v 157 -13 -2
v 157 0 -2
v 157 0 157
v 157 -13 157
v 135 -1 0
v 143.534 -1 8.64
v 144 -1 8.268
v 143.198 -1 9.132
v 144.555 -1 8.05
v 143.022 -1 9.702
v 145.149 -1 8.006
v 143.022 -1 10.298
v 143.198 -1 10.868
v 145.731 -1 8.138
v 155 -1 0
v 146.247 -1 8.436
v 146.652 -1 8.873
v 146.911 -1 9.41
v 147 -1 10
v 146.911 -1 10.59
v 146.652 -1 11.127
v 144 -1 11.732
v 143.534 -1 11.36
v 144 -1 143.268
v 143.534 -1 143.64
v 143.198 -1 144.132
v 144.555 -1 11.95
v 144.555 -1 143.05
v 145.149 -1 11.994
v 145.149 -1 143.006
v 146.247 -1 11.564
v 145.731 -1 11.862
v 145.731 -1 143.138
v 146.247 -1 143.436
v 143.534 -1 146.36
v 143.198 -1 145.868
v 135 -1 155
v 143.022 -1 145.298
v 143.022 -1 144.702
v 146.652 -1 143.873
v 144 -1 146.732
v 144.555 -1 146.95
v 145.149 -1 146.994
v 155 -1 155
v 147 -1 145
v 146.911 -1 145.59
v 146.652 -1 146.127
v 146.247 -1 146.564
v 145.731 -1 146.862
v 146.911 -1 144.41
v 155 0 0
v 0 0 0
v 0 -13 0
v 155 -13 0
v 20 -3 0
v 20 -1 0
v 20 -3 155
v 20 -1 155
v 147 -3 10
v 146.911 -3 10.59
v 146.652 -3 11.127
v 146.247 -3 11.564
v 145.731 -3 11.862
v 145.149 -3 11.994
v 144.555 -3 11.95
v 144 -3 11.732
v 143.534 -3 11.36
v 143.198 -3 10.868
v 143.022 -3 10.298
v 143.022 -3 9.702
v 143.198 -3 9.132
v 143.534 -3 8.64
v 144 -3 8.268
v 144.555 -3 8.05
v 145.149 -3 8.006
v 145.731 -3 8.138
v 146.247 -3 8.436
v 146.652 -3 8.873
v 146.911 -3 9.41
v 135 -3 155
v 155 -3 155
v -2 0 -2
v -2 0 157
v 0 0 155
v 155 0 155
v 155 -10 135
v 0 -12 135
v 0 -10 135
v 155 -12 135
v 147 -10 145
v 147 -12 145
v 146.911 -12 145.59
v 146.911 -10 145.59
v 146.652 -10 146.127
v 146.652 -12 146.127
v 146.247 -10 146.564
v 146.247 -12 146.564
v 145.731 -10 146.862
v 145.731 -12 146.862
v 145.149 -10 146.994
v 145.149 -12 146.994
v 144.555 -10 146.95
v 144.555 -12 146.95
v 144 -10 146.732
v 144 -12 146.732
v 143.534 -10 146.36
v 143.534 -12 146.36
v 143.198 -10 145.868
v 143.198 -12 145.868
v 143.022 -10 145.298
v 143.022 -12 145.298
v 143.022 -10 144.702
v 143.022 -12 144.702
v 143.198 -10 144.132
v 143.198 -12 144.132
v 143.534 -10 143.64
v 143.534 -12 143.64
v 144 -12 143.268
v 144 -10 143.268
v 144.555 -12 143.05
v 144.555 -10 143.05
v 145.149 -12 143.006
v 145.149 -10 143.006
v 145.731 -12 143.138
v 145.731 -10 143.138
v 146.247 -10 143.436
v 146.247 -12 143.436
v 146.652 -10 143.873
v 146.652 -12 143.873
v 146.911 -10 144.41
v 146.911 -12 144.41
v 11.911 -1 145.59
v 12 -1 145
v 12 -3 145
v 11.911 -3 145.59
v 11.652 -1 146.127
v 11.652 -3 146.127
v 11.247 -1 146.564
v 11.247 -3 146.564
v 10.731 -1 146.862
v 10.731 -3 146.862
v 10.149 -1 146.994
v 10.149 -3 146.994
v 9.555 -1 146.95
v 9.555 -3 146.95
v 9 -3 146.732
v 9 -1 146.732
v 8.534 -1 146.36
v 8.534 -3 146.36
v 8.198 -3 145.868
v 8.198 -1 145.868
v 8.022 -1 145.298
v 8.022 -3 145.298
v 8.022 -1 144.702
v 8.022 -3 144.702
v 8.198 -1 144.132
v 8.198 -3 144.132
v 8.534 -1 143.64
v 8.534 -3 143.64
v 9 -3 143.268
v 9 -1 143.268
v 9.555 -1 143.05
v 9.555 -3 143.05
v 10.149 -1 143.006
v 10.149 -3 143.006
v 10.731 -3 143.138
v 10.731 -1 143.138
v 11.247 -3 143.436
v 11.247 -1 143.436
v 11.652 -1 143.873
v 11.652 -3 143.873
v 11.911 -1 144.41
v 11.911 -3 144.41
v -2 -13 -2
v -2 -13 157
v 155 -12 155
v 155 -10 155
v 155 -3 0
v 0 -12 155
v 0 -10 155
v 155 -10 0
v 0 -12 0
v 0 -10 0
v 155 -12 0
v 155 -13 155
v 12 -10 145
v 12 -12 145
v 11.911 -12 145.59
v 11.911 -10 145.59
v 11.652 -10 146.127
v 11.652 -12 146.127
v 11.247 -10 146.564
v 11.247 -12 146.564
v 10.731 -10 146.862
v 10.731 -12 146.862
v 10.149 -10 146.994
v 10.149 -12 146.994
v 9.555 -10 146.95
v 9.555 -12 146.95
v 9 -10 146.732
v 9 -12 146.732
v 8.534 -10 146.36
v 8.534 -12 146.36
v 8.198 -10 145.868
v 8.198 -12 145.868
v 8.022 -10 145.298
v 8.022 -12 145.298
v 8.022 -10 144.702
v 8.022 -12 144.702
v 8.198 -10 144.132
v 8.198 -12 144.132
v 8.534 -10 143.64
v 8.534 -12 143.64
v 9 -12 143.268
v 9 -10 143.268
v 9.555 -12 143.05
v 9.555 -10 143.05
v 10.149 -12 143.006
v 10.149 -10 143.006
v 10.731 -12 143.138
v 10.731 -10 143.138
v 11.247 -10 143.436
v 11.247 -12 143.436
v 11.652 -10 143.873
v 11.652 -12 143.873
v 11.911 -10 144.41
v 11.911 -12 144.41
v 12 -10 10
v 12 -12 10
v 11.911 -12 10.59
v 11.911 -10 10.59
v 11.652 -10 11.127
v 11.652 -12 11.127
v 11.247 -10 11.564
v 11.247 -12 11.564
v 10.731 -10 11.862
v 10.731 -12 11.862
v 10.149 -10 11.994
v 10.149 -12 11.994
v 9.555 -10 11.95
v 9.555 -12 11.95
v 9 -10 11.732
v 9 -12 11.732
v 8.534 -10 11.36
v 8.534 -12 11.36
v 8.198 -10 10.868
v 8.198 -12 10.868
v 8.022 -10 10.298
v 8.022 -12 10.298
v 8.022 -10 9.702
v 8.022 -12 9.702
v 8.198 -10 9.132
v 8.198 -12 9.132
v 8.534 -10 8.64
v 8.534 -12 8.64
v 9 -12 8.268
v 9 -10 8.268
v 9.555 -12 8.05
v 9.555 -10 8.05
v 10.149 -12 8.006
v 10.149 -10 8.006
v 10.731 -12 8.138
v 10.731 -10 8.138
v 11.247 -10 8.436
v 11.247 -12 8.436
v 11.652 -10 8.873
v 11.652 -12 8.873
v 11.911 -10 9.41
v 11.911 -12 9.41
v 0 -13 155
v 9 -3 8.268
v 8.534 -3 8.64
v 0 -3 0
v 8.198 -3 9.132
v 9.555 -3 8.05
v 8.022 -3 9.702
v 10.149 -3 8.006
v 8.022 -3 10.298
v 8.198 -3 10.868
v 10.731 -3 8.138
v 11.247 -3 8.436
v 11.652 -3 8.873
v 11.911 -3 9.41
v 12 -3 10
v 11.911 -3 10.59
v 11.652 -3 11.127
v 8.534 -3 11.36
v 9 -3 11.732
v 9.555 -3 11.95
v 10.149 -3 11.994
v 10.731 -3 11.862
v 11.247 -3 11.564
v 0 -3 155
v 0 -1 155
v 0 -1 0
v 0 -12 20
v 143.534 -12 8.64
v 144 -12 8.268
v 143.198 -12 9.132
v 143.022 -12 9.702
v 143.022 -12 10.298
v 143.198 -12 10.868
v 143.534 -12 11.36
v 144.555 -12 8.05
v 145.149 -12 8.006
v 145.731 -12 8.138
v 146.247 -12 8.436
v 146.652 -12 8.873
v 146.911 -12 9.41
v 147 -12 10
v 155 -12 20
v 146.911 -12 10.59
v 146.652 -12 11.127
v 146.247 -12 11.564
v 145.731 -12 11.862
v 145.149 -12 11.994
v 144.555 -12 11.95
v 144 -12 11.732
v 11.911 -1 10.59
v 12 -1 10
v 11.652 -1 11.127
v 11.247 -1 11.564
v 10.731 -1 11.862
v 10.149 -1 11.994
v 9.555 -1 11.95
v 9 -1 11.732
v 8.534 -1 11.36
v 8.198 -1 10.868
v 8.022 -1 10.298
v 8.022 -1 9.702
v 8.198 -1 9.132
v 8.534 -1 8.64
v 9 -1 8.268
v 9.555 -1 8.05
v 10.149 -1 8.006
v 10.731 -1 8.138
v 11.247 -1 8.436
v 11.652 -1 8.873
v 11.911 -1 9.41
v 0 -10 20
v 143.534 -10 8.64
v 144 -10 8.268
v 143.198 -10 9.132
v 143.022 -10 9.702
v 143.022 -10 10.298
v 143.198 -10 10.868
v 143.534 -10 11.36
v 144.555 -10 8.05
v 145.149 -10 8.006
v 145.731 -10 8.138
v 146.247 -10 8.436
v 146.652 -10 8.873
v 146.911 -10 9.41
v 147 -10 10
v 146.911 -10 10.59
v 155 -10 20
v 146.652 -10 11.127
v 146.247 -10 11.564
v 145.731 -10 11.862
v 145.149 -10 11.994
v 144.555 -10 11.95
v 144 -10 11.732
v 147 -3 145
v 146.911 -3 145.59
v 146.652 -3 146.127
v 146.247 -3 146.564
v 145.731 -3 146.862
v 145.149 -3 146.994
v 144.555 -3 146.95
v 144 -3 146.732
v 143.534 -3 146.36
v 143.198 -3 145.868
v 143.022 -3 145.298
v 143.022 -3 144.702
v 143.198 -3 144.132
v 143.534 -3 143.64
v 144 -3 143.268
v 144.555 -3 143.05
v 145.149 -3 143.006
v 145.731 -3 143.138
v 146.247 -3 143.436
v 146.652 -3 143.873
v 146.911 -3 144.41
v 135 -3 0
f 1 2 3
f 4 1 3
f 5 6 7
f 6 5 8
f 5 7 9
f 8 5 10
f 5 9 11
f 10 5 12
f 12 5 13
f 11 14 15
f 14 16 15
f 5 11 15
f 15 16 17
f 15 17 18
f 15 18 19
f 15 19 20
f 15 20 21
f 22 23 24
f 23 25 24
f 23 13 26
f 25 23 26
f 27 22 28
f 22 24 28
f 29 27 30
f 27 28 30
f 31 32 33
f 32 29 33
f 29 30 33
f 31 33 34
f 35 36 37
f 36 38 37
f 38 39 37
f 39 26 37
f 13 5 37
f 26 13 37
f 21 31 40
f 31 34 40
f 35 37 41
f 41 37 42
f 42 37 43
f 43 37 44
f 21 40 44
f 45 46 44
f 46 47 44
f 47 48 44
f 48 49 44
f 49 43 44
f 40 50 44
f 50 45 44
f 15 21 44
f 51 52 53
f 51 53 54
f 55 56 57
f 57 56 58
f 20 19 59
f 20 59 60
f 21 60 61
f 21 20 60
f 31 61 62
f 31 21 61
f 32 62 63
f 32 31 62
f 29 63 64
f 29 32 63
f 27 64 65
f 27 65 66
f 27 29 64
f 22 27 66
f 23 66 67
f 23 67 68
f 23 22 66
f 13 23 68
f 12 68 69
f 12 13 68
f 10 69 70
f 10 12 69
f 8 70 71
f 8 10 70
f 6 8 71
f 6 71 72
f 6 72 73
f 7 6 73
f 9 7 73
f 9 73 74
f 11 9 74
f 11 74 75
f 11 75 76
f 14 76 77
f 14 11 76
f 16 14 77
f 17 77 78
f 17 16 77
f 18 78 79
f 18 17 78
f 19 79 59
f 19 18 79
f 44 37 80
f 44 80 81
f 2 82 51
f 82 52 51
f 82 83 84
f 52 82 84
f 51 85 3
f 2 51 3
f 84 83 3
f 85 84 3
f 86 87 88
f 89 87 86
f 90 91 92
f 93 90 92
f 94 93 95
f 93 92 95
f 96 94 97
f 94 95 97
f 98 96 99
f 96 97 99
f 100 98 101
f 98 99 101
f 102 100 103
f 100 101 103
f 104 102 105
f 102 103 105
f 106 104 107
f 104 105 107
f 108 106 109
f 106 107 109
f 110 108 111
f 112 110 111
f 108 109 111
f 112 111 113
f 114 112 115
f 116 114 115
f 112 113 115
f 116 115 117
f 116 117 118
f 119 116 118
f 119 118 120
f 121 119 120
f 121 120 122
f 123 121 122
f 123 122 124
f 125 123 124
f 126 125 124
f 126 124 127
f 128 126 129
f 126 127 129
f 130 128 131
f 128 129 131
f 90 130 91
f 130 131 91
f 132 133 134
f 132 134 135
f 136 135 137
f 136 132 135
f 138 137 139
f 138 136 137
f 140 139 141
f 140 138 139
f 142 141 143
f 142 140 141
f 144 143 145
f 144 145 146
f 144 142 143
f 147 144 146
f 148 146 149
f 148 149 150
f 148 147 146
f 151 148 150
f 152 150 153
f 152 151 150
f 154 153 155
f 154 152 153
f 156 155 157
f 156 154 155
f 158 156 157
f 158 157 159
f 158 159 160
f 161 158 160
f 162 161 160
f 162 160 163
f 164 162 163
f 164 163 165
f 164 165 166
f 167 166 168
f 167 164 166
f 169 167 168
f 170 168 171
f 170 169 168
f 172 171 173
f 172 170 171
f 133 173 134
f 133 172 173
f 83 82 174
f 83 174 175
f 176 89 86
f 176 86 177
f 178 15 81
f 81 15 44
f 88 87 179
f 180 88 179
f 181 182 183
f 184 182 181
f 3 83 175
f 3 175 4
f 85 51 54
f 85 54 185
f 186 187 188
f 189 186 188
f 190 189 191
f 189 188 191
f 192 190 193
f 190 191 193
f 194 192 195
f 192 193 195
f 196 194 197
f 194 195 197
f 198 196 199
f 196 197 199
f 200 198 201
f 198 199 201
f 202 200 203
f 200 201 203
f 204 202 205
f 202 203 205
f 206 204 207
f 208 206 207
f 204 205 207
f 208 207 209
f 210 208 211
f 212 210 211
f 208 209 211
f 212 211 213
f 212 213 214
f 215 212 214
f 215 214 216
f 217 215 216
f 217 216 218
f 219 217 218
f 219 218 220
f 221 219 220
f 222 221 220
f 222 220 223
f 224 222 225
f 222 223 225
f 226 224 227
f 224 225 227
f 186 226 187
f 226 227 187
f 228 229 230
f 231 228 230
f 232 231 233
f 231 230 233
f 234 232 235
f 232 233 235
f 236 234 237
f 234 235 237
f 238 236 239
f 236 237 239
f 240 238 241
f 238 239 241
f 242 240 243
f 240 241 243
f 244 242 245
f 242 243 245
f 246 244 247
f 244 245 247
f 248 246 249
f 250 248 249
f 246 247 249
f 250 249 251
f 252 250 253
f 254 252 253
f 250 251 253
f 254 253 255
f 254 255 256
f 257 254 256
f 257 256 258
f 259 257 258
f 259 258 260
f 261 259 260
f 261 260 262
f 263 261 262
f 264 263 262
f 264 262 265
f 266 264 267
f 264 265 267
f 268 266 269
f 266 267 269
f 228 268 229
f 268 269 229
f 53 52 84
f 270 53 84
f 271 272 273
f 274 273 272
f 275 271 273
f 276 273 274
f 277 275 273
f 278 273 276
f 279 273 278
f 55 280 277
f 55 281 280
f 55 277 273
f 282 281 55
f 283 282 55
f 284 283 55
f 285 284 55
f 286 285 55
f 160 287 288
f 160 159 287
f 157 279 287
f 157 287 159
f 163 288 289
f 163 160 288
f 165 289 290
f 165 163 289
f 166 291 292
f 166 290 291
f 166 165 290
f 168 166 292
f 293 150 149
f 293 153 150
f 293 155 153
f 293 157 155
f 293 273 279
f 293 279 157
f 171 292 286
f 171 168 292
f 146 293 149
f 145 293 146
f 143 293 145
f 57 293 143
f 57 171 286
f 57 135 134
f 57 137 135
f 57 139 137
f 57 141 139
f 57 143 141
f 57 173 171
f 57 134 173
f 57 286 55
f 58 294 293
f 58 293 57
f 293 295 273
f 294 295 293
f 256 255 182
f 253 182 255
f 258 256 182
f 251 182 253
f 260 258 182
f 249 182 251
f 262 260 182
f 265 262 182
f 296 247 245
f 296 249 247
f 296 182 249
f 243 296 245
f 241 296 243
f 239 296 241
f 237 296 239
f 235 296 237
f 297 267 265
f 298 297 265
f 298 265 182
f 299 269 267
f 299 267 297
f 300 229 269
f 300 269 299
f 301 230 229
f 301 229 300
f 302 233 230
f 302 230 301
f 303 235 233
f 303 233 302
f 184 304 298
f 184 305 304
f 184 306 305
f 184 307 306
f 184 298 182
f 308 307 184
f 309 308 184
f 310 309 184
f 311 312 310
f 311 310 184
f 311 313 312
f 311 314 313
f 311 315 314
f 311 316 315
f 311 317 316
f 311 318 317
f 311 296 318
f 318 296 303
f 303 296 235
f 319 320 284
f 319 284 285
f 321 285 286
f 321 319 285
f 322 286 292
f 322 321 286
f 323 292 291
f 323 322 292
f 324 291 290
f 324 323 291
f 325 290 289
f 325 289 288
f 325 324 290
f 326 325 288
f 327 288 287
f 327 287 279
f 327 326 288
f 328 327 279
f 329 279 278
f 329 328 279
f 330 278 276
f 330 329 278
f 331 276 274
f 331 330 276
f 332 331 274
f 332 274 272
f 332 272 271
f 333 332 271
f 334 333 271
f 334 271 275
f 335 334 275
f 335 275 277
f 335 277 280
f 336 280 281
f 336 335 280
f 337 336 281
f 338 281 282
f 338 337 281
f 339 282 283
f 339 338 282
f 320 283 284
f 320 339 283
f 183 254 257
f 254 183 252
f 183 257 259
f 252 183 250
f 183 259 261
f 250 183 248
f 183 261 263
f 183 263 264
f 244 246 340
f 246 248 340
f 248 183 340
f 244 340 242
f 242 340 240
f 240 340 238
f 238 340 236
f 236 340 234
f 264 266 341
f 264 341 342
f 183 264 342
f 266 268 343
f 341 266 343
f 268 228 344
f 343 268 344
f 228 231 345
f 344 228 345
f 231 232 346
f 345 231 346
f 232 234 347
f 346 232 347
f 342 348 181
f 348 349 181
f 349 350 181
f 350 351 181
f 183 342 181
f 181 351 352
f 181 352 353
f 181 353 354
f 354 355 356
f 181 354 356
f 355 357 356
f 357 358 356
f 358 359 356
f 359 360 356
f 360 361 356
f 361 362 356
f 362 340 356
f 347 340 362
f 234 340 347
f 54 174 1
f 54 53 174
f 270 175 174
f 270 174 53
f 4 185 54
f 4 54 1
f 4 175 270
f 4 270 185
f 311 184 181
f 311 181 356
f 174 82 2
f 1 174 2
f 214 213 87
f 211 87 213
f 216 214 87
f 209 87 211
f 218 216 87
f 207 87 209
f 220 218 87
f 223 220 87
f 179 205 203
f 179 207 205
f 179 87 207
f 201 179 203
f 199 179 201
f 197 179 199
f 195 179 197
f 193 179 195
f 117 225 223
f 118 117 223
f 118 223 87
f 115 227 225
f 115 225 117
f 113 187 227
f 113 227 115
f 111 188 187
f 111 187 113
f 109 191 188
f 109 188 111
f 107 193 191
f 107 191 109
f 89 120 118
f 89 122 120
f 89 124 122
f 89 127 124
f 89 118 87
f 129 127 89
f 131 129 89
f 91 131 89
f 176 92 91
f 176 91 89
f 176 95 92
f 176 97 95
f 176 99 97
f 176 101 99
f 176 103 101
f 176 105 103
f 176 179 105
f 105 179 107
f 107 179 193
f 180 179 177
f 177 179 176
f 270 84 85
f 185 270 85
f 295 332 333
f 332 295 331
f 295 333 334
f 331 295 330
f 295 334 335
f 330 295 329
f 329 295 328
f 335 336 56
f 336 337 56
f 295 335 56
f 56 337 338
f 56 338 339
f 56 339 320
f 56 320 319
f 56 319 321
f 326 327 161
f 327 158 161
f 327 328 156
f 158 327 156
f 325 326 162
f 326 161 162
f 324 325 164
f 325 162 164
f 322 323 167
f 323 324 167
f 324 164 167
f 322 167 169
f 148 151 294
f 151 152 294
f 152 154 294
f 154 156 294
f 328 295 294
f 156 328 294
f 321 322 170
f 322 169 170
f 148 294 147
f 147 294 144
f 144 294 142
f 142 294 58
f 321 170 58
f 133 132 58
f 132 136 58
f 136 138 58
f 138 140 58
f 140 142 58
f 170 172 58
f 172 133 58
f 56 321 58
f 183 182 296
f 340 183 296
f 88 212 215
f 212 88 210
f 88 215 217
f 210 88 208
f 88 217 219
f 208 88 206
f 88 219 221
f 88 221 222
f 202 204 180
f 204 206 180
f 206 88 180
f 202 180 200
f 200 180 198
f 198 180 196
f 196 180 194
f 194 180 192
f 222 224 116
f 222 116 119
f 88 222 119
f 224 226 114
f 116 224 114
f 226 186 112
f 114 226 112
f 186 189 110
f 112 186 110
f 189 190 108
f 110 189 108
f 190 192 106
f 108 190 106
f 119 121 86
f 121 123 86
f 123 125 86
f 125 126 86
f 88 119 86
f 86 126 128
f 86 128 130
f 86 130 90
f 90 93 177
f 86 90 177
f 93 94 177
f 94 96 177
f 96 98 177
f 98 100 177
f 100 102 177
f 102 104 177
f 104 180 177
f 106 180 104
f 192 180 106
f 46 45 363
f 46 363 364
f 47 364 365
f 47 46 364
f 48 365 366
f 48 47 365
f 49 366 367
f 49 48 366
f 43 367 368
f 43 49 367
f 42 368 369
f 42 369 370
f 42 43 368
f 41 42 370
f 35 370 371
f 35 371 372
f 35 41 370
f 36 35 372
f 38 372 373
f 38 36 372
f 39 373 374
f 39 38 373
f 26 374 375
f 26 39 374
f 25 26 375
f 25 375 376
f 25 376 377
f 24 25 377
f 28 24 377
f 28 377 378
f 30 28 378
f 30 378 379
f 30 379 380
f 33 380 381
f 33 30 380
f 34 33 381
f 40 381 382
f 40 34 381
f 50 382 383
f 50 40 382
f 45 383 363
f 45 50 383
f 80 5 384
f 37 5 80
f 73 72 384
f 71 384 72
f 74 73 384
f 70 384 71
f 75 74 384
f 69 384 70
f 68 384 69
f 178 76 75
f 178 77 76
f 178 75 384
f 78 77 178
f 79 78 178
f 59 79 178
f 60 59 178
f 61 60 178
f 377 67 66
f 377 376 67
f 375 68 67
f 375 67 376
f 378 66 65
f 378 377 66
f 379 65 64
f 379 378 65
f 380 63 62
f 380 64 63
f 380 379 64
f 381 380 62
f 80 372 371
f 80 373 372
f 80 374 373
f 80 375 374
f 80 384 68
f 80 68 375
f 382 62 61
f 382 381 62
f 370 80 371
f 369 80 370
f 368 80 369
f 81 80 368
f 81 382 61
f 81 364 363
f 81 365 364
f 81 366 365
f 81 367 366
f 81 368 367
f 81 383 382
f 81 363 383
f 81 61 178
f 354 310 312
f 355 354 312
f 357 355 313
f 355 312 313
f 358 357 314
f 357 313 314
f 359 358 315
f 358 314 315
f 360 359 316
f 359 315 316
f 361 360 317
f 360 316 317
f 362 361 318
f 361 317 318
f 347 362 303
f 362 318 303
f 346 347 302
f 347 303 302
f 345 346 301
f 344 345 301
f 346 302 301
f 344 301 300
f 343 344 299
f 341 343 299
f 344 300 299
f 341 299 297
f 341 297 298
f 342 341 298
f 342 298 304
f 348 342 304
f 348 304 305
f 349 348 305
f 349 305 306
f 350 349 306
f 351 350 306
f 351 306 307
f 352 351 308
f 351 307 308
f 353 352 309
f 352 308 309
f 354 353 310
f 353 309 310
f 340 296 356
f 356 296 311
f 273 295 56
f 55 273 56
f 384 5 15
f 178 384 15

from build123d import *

# Parameters (mm, degrees)
F0_W     = 159
F0_H     = 159
F0_W_2   = 155
F0_H_2   = 155
F1_DEPTH = 13
F3_W     = 20
F3_H     = 155
F3_R     = 2
F4_DEPTH = 2
F6_W     = 155
F6_H     = 20
F6_R     = 2
F7_DEPTH = 2


with BuildPart() as f1:
    # F0 (on Front) → F1 (new body)
    with BuildSketch(Plane.XZ):
        with Locations((77.5, 77.5)):
            Rectangle(F0_W, F0_H)
        with Locations((77.5, 77.5)):
            Rectangle(F0_W_2, F0_H_2, mode=Mode.SUBTRACT)
    extrude(amount=F1_DEPTH)


with BuildPart() as f4:
    # F3 (on offset) → F4 (new body)
    with BuildSketch(Plane.XZ.offset(1)):
        with Locations((10, 77.5)):
            Rectangle(F3_W, F3_H)
        with Locations((10, 10)):
            Circle(F3_R, mode=Mode.SUBTRACT)
        with Locations((10, 145)):
            Circle(F3_R, mode=Mode.SUBTRACT)
    extrude(amount=F4_DEPTH)


with BuildPart() as f4b:
    # F3 (on offset) → F4, piece 2 (new body)
    with BuildSketch(Plane.XZ.offset(1)):
        with Locations((145, 77.5)):
            Rectangle(F3_W, F3_H)
        with Locations((145, 10)):
            Circle(F3_R, mode=Mode.SUBTRACT)
        with Locations((145, 145)):
            Circle(F3_R, mode=Mode.SUBTRACT)
    extrude(amount=F4_DEPTH)


with BuildPart() as f7:
    # F6 (on offset) → F7 (new body)
    with BuildSketch(Plane.XZ.offset(12)):
        with Locations((77.5, 145)):
            Rectangle(F6_W, F6_H)
        with Locations((10, 145)):
            Circle(F6_R, mode=Mode.SUBTRACT)
        with Locations((145, 145)):
            Circle(F6_R, mode=Mode.SUBTRACT)
    extrude(amount=-F7_DEPTH)


with BuildPart() as f7b:
    # F6 (on offset) → F7, piece 2 (new body)
    with BuildSketch(Plane.XZ.offset(12)):
        with Locations((77.5, 10)):
            Rectangle(F6_W, F6_H)
        with Locations((10, 10)):
            Circle(F6_R, mode=Mode.SUBTRACT)
        with Locations((145, 10)):
            Circle(F6_R, mode=Mode.SUBTRACT)
    extrude(amount=-F7_DEPTH)


solid = Compound([f1.part, f4.part, f4b.part, f7.part, f7b.part])
